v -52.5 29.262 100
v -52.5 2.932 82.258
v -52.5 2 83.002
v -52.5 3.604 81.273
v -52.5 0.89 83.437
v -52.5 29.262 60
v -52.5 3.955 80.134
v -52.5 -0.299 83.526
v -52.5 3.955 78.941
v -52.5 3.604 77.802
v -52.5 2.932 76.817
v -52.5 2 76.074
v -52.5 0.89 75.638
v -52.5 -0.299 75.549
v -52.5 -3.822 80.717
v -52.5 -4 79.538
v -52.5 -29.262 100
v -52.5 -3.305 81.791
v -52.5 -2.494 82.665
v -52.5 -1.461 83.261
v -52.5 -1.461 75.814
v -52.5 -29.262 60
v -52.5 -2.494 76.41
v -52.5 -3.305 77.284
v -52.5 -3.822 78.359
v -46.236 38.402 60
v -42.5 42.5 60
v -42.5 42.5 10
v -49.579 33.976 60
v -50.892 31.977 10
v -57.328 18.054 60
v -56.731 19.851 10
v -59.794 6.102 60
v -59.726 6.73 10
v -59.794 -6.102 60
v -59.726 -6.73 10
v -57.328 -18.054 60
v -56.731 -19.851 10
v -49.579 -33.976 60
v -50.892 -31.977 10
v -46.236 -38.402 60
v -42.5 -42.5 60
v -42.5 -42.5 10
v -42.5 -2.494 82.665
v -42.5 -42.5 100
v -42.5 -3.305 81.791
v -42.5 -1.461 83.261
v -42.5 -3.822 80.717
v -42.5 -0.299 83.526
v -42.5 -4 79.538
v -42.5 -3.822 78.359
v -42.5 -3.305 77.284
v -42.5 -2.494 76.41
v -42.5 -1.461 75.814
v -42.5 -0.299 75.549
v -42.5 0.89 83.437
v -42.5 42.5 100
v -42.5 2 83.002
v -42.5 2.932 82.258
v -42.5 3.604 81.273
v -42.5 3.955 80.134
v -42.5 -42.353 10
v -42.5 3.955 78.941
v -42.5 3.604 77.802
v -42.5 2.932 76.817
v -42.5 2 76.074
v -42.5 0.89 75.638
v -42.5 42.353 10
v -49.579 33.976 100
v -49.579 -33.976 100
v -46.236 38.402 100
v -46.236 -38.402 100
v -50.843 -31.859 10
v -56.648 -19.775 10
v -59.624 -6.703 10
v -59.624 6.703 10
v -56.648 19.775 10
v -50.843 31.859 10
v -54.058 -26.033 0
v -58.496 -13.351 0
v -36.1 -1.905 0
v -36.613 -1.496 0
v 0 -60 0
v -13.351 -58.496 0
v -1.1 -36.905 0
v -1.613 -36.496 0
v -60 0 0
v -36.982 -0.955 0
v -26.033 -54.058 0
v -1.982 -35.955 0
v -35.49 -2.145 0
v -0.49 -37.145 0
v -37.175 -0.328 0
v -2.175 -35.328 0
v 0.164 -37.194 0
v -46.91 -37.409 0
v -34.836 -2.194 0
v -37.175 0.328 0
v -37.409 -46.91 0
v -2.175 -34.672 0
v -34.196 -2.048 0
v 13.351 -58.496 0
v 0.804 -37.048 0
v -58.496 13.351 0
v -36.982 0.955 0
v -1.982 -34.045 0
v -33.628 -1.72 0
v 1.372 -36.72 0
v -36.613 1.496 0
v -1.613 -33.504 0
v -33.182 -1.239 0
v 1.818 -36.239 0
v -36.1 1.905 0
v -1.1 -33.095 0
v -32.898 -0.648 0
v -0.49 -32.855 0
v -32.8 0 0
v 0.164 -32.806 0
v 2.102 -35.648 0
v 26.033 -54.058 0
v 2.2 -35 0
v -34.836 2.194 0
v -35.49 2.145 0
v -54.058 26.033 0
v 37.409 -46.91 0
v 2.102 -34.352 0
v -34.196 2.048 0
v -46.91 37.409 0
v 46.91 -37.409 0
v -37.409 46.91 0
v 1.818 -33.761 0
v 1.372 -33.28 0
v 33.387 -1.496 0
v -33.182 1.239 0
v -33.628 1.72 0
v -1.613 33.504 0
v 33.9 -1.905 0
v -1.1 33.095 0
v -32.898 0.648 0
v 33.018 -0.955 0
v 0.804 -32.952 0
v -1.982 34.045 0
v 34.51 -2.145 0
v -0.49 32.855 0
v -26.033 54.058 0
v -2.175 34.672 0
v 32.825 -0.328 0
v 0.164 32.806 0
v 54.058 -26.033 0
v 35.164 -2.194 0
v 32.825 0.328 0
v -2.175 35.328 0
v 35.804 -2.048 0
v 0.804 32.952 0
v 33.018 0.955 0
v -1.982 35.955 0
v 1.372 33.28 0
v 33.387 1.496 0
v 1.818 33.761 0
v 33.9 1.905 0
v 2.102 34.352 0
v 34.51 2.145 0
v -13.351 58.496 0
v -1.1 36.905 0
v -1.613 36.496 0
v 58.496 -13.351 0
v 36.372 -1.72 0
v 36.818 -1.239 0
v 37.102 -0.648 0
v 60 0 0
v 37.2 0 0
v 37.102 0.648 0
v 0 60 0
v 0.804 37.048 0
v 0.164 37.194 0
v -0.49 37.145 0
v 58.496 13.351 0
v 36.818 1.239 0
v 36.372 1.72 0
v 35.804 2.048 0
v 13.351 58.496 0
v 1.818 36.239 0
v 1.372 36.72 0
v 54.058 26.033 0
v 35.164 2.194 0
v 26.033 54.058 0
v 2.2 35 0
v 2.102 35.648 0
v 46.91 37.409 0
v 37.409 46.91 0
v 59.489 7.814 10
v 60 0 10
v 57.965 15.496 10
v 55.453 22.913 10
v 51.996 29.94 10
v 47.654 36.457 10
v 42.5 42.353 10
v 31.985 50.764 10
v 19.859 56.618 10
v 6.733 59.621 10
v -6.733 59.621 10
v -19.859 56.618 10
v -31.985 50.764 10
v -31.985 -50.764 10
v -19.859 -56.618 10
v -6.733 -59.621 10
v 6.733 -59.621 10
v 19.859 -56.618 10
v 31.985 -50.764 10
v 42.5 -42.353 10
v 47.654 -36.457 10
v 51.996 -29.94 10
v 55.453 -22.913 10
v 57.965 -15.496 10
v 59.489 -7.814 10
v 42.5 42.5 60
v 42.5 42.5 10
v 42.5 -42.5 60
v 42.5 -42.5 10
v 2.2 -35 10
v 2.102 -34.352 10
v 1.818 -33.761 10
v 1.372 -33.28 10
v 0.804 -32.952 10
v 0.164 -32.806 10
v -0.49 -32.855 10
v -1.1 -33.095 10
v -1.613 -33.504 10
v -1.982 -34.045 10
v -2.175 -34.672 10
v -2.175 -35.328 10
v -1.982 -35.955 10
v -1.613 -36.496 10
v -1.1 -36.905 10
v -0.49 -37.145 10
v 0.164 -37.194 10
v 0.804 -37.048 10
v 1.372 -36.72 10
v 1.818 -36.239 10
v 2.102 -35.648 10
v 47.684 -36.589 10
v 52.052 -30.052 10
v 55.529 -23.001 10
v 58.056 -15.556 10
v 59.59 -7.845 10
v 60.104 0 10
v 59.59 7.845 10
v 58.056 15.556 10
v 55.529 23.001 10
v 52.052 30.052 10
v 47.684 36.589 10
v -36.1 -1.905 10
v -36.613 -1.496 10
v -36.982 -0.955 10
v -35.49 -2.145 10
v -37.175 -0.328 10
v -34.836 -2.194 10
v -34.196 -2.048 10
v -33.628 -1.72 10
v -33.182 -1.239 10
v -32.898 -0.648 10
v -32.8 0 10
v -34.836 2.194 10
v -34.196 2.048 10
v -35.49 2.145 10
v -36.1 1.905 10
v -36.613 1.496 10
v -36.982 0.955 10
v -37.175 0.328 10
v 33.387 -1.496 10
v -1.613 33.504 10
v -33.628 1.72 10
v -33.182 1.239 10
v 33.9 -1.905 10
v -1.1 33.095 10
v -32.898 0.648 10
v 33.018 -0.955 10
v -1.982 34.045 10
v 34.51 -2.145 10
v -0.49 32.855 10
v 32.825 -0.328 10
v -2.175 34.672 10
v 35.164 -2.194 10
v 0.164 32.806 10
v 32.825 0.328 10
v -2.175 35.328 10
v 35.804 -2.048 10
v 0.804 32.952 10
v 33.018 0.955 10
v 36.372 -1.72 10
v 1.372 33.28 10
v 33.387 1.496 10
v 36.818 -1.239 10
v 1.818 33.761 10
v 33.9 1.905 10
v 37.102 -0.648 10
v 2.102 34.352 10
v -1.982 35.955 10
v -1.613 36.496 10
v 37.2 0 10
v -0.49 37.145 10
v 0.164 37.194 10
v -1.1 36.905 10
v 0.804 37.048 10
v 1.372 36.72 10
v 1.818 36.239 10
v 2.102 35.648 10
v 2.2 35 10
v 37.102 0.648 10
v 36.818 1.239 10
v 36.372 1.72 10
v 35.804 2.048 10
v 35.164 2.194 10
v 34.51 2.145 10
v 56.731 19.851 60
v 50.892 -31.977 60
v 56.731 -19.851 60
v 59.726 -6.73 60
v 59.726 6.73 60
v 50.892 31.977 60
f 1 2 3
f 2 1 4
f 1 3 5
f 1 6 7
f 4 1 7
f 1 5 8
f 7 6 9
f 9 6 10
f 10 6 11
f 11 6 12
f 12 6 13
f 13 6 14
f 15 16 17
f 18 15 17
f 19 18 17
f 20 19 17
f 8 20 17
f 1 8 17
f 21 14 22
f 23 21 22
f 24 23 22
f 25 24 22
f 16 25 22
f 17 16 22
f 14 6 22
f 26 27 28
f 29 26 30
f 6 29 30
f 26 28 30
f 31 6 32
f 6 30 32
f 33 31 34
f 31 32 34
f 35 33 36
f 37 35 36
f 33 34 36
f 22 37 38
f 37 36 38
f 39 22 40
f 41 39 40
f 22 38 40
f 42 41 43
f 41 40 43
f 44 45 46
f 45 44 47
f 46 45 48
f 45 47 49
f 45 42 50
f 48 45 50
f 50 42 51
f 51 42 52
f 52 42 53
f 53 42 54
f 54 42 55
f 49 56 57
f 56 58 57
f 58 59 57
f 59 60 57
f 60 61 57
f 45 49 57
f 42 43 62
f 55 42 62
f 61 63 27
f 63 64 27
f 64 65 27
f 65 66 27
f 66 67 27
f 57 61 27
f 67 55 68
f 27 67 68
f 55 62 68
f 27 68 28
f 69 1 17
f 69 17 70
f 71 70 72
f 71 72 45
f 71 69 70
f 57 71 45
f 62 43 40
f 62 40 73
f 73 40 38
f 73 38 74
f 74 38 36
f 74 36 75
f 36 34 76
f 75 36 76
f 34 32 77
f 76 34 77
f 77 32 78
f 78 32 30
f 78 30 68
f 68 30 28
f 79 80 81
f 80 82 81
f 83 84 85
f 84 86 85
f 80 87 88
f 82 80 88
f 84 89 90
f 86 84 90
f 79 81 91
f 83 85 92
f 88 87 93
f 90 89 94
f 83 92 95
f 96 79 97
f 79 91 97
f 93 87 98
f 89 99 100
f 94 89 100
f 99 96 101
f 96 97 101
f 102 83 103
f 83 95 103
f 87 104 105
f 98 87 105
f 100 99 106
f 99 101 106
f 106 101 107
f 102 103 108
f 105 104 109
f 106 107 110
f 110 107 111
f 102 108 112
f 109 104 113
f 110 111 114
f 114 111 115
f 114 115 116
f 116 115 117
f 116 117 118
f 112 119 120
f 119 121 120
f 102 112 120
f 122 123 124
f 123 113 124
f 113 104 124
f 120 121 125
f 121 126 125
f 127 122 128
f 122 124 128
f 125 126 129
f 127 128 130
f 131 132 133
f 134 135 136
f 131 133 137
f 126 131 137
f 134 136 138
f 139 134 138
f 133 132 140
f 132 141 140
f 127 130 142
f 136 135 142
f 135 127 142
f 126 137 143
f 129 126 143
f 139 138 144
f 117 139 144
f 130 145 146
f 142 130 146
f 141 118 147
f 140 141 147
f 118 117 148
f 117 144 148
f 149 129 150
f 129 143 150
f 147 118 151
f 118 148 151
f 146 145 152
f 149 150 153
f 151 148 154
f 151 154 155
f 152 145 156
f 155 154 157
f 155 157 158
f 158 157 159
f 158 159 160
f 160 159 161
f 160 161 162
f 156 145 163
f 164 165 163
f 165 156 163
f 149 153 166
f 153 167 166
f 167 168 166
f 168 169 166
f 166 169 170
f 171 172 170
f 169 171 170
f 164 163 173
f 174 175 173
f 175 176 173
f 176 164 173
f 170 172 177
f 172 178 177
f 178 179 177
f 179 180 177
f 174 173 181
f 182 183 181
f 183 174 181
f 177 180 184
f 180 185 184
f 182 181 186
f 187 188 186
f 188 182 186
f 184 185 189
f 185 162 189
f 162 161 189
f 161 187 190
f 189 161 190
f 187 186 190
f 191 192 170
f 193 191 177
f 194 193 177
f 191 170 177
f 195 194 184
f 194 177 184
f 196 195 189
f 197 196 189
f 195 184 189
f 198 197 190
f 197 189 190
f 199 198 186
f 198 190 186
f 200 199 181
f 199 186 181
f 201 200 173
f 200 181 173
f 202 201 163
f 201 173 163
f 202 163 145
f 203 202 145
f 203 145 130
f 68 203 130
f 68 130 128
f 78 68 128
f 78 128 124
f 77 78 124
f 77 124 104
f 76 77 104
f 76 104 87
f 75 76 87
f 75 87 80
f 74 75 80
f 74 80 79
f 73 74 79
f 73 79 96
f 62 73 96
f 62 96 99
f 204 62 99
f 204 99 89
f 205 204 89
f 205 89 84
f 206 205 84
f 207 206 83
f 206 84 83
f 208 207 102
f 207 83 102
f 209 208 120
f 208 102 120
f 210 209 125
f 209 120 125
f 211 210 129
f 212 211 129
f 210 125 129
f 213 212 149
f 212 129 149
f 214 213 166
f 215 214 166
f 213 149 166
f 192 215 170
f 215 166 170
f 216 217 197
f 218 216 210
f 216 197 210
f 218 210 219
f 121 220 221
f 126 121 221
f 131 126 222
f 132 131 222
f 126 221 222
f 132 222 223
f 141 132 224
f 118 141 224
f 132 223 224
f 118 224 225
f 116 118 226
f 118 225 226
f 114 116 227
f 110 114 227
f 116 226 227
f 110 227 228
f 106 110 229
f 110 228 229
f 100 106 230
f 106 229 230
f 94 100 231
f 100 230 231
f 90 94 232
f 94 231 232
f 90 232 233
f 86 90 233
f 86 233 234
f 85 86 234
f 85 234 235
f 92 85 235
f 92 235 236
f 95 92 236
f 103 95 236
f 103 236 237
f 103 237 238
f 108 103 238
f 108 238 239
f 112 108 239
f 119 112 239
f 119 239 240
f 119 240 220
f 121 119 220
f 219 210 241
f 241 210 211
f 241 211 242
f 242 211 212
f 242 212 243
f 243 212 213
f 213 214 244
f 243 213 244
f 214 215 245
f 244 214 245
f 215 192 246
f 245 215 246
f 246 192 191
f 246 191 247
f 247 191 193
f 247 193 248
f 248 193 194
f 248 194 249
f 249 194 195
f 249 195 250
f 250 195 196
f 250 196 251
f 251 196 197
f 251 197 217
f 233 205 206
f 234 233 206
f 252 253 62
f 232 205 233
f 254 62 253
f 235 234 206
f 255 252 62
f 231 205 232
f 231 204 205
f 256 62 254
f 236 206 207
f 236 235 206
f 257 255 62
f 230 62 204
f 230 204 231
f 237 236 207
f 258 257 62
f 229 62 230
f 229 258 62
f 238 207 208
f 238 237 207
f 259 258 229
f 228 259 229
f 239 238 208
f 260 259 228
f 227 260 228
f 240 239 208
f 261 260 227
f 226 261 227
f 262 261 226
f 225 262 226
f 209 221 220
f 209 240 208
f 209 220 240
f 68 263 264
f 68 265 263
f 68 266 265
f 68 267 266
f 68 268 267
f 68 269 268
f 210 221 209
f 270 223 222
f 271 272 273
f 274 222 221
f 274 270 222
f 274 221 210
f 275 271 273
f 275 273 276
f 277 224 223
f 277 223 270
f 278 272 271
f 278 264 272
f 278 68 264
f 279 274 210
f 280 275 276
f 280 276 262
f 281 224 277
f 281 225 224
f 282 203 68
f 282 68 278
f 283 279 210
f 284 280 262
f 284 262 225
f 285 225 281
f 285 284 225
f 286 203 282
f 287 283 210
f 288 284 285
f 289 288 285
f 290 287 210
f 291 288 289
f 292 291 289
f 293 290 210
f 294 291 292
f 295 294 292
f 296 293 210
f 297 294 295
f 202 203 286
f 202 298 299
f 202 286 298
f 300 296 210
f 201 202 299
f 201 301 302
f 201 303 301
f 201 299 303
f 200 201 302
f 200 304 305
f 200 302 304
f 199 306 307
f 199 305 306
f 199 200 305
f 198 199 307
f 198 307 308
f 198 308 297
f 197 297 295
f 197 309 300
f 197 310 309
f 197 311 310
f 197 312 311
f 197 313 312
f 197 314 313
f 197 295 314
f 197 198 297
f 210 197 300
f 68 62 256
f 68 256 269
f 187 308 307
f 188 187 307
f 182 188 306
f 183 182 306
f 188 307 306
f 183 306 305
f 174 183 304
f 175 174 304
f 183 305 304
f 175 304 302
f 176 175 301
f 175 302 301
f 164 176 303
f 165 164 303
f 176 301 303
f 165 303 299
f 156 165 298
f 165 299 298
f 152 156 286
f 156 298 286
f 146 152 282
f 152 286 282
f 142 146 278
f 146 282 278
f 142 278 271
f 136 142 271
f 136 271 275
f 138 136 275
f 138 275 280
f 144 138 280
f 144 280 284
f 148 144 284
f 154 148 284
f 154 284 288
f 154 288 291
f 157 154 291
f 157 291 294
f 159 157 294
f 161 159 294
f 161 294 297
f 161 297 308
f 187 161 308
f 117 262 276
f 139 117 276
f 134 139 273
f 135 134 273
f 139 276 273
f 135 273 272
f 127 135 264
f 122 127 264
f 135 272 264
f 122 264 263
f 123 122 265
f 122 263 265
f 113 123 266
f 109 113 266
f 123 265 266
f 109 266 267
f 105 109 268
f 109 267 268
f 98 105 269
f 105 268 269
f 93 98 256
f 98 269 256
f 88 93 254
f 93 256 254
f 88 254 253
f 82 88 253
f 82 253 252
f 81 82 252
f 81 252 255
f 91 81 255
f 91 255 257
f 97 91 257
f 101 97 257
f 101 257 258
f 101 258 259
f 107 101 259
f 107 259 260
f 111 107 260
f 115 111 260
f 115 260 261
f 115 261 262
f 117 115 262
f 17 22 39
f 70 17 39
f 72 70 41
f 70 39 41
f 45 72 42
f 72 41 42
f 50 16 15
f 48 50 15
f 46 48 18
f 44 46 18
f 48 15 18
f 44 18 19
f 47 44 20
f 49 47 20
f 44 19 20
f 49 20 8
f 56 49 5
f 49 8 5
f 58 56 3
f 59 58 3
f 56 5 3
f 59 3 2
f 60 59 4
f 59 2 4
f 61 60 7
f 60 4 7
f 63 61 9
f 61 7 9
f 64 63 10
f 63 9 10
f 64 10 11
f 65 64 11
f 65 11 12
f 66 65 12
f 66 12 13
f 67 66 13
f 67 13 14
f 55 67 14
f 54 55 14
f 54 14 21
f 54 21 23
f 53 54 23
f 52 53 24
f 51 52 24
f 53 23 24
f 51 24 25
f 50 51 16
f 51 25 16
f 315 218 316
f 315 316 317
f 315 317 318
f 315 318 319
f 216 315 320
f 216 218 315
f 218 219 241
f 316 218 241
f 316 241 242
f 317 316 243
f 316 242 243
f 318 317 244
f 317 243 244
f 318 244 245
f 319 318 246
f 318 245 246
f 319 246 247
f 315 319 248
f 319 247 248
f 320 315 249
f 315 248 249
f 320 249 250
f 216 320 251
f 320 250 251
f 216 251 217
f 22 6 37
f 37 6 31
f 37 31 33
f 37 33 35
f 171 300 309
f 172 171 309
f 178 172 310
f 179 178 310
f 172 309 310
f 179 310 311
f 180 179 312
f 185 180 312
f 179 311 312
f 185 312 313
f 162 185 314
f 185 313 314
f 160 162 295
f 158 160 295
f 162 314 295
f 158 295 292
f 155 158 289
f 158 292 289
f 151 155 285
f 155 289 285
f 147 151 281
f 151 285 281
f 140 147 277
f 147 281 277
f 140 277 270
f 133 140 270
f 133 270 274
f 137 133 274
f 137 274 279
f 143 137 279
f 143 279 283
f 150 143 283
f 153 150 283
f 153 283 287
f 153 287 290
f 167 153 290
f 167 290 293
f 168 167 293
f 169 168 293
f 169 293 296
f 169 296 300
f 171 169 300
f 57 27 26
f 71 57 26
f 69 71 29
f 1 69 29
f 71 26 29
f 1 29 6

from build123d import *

# Parameters (mm, degrees)
F0_R     = 60
F1_DEPTH = 10
F2_R     = 2.2
F3_DEPTH = 14
F5_DEPTH = 50
F7_DEPTH = 40
F8_R     = 4
F9_DEPTH = 10


with BuildPart() as f1:
    # F0 (on Top) → F1 (new body)
    with BuildSketch(Plane.XY):
        Circle(F0_R)
    extrude(amount=F1_DEPTH)

    # F2 (on face) → F3 (cut)
    with BuildSketch(Plane.XY.offset(10)):
        with Locations((0, 35)):
            Circle(F2_R)
        with Locations((35, 0)):
            Circle(F2_R)
        with Locations((-35, 0)):
            Circle(F2_R)
        with Locations((0, -35)):
            Circle(F2_R)
    extrude(amount=-F3_DEPTH, mode=Mode.SUBTRACT)

    # F4 (on face) → F5 (join)
    with BuildSketch(Plane.XY.offset(10)):
        with BuildLine():
            ThreePointArc((42.5, -42.5), (60.104076, 0), (42.5, 42.5))
            Line((42.5, 42.5), (42.5, -42.5))
        make_face()
        with BuildLine():
            Line((-42.5, -42.5), (-42.5, 42.5))
            ThreePointArc((-42.5, 42.5), (-60.104076, 0), (-42.5, -42.5))
        make_face()
    extrude(amount=F5_DEPTH)

    # F6 (on face) → F7 (join)
    with BuildSketch(Plane.XY.offset(60)):
        with BuildLine():
            Line((-42.5, -42.5), (-42.5, 42.5))
            ThreePointArc((-42.5, 42.5), (-47.95897, 36.227575), (-52.5, 29.26175))
            Line((-52.5, 29.26175), (-52.5, -29.26175))
            ThreePointArc((-52.5, -29.26175), (-47.95897, -36.227575), (-42.5, -42.5))
        make_face()
    extrude(amount=F7_DEPTH)

    # F8 (on face) → F9 (cut)
    with BuildSketch(Plane(origin=(-52.5, 0, 0), x_dir=(0, -1, 0), z_dir=(-1, 0, 0))):
        with Locations((0, 79.53766)):
            Circle(F8_R)
    extrude(amount=-F9_DEPTH, mode=Mode.SUBTRACT)


solid = f1.part
